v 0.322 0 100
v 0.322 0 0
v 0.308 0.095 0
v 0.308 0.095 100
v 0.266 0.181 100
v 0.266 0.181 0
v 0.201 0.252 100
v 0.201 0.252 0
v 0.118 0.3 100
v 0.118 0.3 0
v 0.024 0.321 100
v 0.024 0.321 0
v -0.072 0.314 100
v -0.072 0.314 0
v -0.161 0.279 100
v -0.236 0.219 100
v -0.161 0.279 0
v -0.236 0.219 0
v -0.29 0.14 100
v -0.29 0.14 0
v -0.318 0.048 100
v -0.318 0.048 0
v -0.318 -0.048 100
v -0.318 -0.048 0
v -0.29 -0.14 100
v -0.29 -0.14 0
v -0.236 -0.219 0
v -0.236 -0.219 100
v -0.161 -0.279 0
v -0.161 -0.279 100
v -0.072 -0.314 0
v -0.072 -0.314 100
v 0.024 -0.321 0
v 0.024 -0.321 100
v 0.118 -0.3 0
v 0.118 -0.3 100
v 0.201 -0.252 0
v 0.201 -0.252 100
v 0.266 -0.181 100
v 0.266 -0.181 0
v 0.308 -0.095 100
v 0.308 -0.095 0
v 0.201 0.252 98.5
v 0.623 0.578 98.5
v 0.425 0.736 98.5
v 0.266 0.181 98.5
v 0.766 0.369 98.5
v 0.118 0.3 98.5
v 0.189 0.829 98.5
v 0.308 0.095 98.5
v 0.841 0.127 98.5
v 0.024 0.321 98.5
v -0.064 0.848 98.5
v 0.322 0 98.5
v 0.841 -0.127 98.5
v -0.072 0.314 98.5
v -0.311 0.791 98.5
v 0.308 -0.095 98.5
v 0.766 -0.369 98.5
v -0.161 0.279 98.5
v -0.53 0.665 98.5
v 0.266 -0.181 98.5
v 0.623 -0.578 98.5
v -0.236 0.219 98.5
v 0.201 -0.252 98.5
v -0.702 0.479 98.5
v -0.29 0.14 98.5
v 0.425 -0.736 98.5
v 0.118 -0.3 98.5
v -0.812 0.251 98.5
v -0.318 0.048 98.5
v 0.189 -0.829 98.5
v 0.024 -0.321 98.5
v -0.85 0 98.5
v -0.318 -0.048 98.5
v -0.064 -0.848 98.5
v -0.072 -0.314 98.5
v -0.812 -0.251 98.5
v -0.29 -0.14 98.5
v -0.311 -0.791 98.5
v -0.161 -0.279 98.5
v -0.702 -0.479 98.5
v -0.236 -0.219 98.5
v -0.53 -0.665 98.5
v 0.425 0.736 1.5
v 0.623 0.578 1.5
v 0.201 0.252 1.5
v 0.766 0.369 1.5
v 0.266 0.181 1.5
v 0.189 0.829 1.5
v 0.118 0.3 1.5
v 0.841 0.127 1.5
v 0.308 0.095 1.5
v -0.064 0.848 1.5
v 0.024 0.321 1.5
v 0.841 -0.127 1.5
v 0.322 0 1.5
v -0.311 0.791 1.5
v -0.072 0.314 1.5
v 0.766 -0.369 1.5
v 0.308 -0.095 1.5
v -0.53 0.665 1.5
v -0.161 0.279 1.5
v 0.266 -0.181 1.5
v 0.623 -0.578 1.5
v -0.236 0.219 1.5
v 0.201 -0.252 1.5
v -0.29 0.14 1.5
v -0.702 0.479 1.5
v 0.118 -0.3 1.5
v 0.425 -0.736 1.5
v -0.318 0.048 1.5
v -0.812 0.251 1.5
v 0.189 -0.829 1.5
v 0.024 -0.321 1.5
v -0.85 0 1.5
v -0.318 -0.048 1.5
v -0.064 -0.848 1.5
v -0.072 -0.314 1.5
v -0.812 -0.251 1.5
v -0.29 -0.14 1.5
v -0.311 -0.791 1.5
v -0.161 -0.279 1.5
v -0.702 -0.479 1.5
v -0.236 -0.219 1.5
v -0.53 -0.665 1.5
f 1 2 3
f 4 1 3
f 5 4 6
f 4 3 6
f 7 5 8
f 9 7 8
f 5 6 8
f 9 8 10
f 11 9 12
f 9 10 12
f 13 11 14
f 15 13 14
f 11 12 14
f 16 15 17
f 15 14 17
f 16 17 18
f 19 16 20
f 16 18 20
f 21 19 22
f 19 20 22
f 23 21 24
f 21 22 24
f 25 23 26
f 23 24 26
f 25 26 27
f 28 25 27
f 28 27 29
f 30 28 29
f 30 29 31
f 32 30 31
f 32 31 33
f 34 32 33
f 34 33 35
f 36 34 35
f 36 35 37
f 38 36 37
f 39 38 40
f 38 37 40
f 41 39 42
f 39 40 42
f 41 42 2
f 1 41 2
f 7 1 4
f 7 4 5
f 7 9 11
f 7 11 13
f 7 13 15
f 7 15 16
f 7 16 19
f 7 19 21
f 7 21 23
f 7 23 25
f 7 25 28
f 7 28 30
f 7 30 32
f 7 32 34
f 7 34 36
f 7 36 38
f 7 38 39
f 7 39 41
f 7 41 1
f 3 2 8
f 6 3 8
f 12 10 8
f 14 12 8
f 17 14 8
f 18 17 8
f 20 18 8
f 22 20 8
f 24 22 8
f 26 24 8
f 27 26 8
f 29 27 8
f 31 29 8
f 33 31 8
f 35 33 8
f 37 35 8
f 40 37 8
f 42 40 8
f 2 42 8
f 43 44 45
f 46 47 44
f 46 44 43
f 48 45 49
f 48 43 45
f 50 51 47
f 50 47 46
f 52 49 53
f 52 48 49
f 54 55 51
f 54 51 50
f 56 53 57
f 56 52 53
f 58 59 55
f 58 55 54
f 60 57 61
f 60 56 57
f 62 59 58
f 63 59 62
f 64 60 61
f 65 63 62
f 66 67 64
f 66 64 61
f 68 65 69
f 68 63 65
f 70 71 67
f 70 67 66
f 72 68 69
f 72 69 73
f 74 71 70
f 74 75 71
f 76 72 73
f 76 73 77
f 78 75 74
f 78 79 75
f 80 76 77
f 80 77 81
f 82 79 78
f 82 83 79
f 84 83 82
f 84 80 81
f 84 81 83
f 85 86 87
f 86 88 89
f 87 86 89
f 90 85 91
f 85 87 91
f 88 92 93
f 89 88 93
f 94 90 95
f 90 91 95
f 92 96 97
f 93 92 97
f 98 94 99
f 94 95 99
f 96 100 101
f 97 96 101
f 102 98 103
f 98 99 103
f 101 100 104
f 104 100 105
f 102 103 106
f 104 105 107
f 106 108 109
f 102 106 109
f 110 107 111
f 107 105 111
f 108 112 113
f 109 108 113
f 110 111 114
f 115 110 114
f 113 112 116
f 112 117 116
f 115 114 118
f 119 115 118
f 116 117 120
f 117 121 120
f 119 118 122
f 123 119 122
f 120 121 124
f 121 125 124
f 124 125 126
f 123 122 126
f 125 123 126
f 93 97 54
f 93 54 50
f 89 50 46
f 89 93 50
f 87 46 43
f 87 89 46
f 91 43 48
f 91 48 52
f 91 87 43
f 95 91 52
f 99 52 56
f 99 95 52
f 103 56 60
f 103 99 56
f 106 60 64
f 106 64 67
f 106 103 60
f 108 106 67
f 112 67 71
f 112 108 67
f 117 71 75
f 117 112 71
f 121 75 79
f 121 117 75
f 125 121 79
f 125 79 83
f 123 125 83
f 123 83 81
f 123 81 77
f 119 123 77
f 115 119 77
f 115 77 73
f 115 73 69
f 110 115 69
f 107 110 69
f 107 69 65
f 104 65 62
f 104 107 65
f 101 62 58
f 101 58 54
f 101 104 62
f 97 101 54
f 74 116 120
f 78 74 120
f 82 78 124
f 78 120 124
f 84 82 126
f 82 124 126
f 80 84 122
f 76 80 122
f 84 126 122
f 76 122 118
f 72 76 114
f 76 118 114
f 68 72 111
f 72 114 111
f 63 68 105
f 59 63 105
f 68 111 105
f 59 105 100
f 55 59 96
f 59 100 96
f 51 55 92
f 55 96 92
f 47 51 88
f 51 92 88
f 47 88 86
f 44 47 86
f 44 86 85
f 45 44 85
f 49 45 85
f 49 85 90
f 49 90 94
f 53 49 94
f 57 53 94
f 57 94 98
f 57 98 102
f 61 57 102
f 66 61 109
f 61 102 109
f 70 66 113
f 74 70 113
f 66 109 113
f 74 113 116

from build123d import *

# Parameters (mm, degrees)
SKETCH1_R           = 0.3219
BOSS_EXTRUDE1_DEPTH = 100
BOSS_EXTRUDE2_START = 1.5
SKETCH1_3_R         = 0.85
SKETCH1_3_R_2       = 0.3219
BOSS_EXTRUDE2_DEPTH = 97


with BuildPart() as part:
    # Sketch1 → Boss-Extrude1 (new body)
    with BuildSketch(Plane.XY):
        Circle(SKETCH1_R)
    extrude(amount=BOSS_EXTRUDE1_DEPTH)


with BuildPart() as body_2:
    # Sketch1<3> → Boss-Extrude2 (new body)
    with BuildSketch(Plane.XY.offset(BOSS_EXTRUDE2_START)):
        with Locations(Location((0, 0, 0), (0, 0, 180))):
            Circle(SKETCH1_3_R)
        Circle(SKETCH1_3_R_2, mode=Mode.SUBTRACT)
    extrude(amount=BOSS_EXTRUDE2_DEPTH)


solid = Compound([part.part, body_2.part])
